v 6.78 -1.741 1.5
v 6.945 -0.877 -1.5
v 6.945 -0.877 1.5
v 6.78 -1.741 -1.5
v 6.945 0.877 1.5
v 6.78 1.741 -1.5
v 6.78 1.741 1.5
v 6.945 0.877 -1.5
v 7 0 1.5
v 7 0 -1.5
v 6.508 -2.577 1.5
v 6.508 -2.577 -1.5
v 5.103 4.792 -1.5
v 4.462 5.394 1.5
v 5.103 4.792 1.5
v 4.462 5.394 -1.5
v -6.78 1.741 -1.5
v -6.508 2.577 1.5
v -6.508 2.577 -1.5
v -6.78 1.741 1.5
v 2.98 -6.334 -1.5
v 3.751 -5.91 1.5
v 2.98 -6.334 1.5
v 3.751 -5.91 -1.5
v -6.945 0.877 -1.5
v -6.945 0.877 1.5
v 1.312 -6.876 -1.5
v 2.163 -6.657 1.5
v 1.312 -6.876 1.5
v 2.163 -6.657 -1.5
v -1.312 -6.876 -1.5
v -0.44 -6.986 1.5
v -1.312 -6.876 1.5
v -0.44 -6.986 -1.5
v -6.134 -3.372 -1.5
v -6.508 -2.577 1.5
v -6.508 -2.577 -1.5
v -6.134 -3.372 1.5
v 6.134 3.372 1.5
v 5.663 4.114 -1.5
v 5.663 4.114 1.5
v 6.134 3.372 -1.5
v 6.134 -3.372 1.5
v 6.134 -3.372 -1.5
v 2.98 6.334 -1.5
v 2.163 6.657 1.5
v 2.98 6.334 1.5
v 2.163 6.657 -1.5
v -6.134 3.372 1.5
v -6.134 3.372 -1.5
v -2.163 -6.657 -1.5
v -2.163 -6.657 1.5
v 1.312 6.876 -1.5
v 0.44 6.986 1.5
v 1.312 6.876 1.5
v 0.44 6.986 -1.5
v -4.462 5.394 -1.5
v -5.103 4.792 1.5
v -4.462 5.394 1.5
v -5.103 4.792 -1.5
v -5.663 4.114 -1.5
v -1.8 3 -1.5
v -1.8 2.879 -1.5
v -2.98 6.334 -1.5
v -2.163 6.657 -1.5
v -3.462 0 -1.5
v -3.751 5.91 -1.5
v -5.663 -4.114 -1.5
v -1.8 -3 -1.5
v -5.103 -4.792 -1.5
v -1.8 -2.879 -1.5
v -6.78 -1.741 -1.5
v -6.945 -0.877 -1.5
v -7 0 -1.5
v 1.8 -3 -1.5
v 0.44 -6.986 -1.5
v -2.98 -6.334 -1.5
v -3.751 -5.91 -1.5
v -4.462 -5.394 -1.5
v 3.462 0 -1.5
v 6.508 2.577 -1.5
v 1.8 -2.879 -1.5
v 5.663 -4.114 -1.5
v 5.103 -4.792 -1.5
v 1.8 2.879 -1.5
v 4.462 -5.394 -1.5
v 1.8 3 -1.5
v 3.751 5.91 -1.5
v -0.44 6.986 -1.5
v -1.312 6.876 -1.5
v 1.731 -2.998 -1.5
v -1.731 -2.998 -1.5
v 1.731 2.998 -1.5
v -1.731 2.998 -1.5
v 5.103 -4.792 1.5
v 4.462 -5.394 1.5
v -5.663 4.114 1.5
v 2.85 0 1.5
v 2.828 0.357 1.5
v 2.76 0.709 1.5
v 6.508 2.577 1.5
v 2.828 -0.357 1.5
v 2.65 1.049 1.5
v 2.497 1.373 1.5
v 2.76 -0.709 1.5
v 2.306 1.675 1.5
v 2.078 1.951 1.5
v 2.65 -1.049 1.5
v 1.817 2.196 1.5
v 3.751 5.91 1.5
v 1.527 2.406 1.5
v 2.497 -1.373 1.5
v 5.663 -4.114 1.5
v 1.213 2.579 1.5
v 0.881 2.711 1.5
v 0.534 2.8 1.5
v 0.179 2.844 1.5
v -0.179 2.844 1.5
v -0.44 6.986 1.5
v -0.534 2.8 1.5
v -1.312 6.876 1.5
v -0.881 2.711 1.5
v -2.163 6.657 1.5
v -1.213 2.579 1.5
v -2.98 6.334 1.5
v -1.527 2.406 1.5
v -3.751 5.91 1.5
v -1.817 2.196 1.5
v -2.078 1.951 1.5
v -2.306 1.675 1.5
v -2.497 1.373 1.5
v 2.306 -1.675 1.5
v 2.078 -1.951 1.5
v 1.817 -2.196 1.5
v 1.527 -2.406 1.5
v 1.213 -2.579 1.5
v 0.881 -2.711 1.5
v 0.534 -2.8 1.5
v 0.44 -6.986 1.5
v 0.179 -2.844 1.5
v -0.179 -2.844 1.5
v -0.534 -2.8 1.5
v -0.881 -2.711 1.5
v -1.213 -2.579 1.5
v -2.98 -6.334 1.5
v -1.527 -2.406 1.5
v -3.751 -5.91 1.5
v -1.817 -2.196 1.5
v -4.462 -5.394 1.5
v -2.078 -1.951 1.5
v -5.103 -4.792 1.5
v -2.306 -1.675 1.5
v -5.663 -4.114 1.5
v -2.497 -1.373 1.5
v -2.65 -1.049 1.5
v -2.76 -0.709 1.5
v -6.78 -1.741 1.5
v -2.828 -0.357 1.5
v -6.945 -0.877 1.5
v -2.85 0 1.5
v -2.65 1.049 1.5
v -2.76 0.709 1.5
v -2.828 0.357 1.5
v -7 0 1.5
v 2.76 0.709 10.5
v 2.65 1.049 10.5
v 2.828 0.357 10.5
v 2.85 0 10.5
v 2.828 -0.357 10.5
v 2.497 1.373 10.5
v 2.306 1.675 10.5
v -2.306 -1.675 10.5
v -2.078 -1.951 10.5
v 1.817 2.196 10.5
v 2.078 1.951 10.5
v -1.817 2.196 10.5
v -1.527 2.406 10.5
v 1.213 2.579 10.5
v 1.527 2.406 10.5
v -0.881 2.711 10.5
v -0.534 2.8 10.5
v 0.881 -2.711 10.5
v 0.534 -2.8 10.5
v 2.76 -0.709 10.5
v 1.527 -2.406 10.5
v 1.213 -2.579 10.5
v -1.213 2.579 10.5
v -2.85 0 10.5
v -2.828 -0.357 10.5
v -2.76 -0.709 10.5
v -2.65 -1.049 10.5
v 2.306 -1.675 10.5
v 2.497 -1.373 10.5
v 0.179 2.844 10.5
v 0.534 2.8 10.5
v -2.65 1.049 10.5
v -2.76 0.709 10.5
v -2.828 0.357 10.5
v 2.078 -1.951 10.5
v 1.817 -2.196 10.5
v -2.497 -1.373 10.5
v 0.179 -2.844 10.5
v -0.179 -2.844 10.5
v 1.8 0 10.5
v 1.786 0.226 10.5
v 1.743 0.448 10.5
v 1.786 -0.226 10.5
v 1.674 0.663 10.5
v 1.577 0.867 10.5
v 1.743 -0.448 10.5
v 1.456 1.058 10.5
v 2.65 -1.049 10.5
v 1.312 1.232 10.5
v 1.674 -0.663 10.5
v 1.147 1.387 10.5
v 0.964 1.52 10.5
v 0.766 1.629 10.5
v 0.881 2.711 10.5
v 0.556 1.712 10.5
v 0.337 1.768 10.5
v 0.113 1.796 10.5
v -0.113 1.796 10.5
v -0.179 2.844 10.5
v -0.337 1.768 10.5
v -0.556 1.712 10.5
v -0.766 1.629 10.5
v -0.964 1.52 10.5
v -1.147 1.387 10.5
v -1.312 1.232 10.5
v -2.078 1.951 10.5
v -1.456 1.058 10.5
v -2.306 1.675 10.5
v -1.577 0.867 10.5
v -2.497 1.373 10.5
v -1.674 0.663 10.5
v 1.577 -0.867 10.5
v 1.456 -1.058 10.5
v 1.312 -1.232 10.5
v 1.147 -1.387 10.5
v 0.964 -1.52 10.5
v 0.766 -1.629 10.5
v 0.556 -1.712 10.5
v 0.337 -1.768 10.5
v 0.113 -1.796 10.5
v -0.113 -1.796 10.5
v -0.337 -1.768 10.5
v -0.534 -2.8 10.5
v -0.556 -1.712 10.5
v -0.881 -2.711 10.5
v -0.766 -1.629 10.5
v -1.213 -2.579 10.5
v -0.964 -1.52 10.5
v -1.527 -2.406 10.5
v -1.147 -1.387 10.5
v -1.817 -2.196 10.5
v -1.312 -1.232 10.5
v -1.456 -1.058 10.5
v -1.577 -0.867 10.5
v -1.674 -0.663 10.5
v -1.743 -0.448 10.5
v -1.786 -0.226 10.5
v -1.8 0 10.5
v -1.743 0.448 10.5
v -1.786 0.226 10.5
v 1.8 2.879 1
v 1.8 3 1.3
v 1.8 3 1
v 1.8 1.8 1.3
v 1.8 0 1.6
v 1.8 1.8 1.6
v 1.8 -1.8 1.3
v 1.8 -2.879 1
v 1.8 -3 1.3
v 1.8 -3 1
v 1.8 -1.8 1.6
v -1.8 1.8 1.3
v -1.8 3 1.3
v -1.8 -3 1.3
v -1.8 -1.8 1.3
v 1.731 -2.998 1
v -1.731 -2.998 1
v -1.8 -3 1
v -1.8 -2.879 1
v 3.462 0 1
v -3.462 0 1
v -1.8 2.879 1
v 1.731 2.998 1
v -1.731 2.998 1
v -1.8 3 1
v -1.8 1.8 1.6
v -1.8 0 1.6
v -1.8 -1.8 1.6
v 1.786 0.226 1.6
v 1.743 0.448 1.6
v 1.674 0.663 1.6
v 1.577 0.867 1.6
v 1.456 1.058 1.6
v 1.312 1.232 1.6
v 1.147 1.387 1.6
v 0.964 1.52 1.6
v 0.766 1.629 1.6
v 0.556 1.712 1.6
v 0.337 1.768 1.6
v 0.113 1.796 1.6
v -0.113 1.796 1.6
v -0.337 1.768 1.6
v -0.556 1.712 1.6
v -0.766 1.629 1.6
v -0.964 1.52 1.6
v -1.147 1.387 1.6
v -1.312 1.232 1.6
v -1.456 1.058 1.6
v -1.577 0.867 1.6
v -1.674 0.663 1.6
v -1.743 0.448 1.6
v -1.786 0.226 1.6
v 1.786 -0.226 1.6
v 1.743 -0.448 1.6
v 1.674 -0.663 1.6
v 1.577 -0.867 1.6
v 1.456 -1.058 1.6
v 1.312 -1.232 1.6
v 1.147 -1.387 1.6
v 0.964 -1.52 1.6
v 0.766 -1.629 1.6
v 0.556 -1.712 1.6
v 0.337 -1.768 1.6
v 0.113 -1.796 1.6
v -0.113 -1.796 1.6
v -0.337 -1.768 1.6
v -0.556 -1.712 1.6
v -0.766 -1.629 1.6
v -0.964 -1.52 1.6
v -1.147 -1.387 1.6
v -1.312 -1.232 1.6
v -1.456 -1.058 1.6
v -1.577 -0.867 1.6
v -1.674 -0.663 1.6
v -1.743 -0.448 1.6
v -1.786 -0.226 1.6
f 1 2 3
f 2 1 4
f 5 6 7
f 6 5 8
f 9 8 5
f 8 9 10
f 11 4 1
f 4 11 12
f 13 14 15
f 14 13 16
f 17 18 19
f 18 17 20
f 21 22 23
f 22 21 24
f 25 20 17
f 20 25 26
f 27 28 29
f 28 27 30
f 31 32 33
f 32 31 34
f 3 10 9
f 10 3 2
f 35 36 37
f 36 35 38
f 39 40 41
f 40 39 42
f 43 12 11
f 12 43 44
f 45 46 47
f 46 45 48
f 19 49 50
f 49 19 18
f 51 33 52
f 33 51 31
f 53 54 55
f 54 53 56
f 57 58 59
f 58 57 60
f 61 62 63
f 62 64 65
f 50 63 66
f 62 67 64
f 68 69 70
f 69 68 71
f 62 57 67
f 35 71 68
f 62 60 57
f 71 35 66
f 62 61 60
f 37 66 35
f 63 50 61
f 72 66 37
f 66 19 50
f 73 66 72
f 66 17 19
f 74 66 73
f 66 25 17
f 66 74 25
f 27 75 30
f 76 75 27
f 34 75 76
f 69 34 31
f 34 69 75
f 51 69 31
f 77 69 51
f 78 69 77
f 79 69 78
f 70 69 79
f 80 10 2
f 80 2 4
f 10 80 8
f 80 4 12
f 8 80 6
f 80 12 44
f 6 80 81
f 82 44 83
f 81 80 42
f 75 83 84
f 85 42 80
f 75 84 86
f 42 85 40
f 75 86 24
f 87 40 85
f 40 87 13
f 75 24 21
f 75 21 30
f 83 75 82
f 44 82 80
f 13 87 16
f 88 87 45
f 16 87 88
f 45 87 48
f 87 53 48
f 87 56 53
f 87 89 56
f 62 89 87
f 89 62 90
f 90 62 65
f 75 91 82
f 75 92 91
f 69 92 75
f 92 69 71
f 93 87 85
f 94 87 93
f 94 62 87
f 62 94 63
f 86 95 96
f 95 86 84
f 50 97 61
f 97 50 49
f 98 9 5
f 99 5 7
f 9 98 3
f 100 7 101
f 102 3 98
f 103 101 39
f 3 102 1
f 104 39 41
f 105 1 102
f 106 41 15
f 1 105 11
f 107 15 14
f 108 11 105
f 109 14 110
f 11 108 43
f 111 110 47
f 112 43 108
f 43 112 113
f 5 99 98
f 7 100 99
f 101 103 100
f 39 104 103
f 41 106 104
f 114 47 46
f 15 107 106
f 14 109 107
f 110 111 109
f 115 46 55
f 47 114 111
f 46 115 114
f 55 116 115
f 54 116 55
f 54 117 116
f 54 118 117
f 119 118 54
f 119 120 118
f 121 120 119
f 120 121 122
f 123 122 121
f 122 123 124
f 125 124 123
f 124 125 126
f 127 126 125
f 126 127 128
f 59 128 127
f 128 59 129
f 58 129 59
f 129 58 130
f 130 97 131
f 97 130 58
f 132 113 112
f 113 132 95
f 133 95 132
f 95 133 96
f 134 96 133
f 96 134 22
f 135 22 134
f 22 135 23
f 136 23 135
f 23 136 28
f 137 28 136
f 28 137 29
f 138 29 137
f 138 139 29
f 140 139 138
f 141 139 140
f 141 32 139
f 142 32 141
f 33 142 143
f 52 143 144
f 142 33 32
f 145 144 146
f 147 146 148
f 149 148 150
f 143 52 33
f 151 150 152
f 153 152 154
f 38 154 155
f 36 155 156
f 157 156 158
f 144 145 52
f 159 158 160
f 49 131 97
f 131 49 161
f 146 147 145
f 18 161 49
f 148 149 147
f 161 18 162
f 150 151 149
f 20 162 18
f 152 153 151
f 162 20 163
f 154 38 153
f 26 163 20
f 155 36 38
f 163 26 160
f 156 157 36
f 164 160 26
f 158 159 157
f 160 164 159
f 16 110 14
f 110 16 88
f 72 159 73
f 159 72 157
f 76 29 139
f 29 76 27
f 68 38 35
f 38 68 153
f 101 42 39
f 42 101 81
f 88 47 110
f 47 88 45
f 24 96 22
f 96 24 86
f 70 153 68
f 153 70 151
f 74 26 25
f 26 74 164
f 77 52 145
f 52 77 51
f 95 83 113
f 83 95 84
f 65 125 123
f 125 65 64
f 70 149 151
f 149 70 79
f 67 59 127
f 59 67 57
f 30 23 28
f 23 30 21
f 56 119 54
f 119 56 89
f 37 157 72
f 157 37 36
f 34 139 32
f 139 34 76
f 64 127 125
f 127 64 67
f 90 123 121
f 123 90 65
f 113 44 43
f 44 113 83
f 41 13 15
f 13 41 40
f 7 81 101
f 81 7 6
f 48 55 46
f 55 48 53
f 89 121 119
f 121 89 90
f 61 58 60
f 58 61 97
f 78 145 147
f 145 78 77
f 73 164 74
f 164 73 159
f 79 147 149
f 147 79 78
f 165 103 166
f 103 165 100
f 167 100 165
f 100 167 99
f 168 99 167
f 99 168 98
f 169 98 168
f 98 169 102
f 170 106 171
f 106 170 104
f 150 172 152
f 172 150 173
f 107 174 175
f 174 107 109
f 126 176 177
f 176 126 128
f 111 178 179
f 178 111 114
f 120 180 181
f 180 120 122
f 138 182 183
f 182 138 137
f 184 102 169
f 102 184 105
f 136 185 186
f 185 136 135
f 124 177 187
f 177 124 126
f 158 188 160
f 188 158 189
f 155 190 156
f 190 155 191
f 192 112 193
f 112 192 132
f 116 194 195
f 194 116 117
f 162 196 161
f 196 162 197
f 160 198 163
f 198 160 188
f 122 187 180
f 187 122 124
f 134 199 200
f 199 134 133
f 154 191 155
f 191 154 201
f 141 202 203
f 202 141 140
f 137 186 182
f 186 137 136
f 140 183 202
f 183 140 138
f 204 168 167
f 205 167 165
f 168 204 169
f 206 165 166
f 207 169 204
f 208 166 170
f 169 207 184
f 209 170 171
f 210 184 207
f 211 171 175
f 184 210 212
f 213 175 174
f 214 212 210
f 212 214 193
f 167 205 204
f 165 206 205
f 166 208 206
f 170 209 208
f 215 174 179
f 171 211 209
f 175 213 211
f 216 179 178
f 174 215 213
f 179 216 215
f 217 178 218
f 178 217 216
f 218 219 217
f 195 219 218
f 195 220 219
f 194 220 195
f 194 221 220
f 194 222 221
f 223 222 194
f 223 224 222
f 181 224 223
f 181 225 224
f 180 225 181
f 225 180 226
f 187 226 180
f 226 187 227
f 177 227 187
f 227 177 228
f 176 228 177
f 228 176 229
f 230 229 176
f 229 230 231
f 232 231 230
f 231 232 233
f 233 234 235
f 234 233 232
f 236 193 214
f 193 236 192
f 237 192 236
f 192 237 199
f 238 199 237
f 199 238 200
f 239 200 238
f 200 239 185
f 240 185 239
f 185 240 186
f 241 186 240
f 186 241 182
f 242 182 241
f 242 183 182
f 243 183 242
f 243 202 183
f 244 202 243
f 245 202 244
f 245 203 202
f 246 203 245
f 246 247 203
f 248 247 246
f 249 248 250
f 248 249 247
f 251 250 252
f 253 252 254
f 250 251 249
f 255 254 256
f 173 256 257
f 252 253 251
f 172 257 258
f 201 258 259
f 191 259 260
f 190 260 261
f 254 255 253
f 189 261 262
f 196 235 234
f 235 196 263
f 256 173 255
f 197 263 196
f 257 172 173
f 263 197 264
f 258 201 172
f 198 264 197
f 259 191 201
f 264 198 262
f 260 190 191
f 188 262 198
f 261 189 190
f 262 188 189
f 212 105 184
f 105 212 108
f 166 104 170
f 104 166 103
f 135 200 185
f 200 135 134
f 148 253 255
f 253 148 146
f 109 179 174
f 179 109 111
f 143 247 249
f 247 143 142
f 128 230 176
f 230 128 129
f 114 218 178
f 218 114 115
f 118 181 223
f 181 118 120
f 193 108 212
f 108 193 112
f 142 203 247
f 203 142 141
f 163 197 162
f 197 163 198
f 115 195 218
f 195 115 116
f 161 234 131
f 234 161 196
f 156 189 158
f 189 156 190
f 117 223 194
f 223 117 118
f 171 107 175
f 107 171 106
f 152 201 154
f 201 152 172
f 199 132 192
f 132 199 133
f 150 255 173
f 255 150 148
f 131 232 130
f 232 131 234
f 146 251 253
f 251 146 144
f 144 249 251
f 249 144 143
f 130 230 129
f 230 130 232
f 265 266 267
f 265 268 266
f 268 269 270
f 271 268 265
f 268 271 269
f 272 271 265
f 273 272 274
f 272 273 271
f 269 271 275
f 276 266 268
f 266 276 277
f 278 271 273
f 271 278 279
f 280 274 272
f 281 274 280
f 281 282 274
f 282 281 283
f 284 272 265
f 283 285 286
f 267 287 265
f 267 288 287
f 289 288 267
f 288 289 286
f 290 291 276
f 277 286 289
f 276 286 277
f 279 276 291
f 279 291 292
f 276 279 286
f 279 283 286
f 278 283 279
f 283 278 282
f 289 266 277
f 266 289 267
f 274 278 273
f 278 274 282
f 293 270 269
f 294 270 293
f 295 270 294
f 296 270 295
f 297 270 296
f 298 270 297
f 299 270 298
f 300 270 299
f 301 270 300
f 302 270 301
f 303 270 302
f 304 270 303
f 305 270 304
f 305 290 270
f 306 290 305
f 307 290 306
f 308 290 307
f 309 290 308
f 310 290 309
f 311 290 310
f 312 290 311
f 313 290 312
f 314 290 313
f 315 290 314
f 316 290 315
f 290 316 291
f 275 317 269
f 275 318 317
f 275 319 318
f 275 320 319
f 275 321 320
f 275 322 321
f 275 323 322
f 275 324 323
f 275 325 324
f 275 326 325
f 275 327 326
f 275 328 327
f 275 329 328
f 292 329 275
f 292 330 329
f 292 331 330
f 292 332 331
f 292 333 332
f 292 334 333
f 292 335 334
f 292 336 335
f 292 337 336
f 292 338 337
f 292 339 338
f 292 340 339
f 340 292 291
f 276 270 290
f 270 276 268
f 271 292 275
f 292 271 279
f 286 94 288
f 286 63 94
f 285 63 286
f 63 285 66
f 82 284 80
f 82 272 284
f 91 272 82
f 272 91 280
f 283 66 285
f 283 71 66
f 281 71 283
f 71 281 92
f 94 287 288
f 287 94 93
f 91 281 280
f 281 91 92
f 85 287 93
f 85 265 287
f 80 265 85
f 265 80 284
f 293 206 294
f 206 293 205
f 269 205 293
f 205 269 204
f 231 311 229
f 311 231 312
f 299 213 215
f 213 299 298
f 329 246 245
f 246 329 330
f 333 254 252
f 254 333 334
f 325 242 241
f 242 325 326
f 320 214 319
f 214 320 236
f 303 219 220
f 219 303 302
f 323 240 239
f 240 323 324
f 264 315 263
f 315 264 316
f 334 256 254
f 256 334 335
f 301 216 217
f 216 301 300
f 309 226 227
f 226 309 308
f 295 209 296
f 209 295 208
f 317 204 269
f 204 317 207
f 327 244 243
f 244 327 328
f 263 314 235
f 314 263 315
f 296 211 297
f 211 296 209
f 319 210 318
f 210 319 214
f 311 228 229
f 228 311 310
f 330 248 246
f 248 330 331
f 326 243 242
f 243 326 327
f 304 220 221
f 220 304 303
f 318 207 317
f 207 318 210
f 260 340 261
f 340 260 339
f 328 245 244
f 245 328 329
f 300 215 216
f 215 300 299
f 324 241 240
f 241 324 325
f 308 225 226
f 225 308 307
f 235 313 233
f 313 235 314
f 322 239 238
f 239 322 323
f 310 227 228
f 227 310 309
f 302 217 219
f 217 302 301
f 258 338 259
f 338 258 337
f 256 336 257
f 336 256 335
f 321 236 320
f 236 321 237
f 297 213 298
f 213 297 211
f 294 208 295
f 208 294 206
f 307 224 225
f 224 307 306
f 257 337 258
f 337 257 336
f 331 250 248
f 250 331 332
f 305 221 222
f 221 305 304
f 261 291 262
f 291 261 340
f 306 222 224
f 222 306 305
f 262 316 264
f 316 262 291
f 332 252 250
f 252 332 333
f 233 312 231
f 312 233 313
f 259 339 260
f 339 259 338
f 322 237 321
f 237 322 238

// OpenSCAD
$fn = 50;


difference() {
	union() {
		translate(v = [0, 0, -1.5000000000]) {
			cylinder(h = 3, r = 7.0000000000);
		}
		translate(v = [0, 0, -1.5000000000]) {
			cylinder(h = 12, r = 2.8500000000);
		}
	}
	union() {
		translate(v = [0, 0, -1.5000000000]) {
			rotate(a = [0, 0, 0]) {
				difference() {
					union() {
						translate(v = [-1.8000000000, -3.0000000000, -0.3000000000]) {
							cube(size = [3.6000000000, 6.0000000000, 0.3000000000]);
						}
						translate(v = [-1.8000000000, -1.8000000000, -0.6000000000]) {
							cube(size = [3.6000000000, 3.6000000000, 0.3000000000]);
						}
						translate(v = [-1.8000000000, -3.0000000000, 2.5000000000]) {
							cube(size = [3.6000000000, 6.0000000000, 0.3000000000]);
						}
						translate(v = [-1.8000000000, -1.8000000000, 2.8000000000]) {
							cube(size = [3.6000000000, 3.6000000000, 0.3000000000]);
						}
						linear_extrude(height = 2.5000000000) {
							polygon(points = [[3.4620000000, 0.0000000000], [1.7310000000, 2.9981799479], [-1.7310000000, 2.9981799479], [-3.4620000000, 0.0000000000], [-1.7310000000, -2.9981799479], [1.7310000000, -2.9981799479]]);
						}
						translate(v = [-1.8000000000, -3.0000000000, -0.3000000000]) {
							cube(size = [3.6000000000, 6.0000000000, 0.3000000000]);
						}
						translate(v = [-1.8000000000, -1.8000000000, -0.6000000000]) {
							cube(size = [3.6000000000, 3.6000000000, 0.3000000000]);
						}
						translate(v = [-1.8000000000, -3.0000000000, 2.5000000000]) {
							cube(size = [3.6000000000, 6.0000000000, 0.3000000000]);
						}
						translate(v = [-1.8000000000, -1.8000000000, 2.8000000000]) {
							cube(size = [3.6000000000, 3.6000000000, 0.3000000000]);
						}
						translate(v = [-1.8000000000, -3.0000000000, -0.3000000000]) {
							cube(size = [3.6000000000, 6.0000000000, 0.3000000000]);
						}
						translate(v = [-1.8000000000, -1.8000000000, -0.6000000000]) {
							cube(size = [3.6000000000, 3.6000000000, 0.3000000000]);
						}
						translate(v = [-1.8000000000, -3.0000000000, 2.5000000000]) {
							cube(size = [3.6000000000, 6.0000000000, 0.3000000000]);
						}
						translate(v = [-1.8000000000, -1.8000000000, 2.8000000000]) {
							cube(size = [3.6000000000, 3.6000000000, 0.3000000000]);
						}
					}
					union();
				}
			}
		}
		translate(v = [0, 0, -50.0000000000]) {
			cylinder(h = 100, r = 1.8000000000);
		}
	}
}
